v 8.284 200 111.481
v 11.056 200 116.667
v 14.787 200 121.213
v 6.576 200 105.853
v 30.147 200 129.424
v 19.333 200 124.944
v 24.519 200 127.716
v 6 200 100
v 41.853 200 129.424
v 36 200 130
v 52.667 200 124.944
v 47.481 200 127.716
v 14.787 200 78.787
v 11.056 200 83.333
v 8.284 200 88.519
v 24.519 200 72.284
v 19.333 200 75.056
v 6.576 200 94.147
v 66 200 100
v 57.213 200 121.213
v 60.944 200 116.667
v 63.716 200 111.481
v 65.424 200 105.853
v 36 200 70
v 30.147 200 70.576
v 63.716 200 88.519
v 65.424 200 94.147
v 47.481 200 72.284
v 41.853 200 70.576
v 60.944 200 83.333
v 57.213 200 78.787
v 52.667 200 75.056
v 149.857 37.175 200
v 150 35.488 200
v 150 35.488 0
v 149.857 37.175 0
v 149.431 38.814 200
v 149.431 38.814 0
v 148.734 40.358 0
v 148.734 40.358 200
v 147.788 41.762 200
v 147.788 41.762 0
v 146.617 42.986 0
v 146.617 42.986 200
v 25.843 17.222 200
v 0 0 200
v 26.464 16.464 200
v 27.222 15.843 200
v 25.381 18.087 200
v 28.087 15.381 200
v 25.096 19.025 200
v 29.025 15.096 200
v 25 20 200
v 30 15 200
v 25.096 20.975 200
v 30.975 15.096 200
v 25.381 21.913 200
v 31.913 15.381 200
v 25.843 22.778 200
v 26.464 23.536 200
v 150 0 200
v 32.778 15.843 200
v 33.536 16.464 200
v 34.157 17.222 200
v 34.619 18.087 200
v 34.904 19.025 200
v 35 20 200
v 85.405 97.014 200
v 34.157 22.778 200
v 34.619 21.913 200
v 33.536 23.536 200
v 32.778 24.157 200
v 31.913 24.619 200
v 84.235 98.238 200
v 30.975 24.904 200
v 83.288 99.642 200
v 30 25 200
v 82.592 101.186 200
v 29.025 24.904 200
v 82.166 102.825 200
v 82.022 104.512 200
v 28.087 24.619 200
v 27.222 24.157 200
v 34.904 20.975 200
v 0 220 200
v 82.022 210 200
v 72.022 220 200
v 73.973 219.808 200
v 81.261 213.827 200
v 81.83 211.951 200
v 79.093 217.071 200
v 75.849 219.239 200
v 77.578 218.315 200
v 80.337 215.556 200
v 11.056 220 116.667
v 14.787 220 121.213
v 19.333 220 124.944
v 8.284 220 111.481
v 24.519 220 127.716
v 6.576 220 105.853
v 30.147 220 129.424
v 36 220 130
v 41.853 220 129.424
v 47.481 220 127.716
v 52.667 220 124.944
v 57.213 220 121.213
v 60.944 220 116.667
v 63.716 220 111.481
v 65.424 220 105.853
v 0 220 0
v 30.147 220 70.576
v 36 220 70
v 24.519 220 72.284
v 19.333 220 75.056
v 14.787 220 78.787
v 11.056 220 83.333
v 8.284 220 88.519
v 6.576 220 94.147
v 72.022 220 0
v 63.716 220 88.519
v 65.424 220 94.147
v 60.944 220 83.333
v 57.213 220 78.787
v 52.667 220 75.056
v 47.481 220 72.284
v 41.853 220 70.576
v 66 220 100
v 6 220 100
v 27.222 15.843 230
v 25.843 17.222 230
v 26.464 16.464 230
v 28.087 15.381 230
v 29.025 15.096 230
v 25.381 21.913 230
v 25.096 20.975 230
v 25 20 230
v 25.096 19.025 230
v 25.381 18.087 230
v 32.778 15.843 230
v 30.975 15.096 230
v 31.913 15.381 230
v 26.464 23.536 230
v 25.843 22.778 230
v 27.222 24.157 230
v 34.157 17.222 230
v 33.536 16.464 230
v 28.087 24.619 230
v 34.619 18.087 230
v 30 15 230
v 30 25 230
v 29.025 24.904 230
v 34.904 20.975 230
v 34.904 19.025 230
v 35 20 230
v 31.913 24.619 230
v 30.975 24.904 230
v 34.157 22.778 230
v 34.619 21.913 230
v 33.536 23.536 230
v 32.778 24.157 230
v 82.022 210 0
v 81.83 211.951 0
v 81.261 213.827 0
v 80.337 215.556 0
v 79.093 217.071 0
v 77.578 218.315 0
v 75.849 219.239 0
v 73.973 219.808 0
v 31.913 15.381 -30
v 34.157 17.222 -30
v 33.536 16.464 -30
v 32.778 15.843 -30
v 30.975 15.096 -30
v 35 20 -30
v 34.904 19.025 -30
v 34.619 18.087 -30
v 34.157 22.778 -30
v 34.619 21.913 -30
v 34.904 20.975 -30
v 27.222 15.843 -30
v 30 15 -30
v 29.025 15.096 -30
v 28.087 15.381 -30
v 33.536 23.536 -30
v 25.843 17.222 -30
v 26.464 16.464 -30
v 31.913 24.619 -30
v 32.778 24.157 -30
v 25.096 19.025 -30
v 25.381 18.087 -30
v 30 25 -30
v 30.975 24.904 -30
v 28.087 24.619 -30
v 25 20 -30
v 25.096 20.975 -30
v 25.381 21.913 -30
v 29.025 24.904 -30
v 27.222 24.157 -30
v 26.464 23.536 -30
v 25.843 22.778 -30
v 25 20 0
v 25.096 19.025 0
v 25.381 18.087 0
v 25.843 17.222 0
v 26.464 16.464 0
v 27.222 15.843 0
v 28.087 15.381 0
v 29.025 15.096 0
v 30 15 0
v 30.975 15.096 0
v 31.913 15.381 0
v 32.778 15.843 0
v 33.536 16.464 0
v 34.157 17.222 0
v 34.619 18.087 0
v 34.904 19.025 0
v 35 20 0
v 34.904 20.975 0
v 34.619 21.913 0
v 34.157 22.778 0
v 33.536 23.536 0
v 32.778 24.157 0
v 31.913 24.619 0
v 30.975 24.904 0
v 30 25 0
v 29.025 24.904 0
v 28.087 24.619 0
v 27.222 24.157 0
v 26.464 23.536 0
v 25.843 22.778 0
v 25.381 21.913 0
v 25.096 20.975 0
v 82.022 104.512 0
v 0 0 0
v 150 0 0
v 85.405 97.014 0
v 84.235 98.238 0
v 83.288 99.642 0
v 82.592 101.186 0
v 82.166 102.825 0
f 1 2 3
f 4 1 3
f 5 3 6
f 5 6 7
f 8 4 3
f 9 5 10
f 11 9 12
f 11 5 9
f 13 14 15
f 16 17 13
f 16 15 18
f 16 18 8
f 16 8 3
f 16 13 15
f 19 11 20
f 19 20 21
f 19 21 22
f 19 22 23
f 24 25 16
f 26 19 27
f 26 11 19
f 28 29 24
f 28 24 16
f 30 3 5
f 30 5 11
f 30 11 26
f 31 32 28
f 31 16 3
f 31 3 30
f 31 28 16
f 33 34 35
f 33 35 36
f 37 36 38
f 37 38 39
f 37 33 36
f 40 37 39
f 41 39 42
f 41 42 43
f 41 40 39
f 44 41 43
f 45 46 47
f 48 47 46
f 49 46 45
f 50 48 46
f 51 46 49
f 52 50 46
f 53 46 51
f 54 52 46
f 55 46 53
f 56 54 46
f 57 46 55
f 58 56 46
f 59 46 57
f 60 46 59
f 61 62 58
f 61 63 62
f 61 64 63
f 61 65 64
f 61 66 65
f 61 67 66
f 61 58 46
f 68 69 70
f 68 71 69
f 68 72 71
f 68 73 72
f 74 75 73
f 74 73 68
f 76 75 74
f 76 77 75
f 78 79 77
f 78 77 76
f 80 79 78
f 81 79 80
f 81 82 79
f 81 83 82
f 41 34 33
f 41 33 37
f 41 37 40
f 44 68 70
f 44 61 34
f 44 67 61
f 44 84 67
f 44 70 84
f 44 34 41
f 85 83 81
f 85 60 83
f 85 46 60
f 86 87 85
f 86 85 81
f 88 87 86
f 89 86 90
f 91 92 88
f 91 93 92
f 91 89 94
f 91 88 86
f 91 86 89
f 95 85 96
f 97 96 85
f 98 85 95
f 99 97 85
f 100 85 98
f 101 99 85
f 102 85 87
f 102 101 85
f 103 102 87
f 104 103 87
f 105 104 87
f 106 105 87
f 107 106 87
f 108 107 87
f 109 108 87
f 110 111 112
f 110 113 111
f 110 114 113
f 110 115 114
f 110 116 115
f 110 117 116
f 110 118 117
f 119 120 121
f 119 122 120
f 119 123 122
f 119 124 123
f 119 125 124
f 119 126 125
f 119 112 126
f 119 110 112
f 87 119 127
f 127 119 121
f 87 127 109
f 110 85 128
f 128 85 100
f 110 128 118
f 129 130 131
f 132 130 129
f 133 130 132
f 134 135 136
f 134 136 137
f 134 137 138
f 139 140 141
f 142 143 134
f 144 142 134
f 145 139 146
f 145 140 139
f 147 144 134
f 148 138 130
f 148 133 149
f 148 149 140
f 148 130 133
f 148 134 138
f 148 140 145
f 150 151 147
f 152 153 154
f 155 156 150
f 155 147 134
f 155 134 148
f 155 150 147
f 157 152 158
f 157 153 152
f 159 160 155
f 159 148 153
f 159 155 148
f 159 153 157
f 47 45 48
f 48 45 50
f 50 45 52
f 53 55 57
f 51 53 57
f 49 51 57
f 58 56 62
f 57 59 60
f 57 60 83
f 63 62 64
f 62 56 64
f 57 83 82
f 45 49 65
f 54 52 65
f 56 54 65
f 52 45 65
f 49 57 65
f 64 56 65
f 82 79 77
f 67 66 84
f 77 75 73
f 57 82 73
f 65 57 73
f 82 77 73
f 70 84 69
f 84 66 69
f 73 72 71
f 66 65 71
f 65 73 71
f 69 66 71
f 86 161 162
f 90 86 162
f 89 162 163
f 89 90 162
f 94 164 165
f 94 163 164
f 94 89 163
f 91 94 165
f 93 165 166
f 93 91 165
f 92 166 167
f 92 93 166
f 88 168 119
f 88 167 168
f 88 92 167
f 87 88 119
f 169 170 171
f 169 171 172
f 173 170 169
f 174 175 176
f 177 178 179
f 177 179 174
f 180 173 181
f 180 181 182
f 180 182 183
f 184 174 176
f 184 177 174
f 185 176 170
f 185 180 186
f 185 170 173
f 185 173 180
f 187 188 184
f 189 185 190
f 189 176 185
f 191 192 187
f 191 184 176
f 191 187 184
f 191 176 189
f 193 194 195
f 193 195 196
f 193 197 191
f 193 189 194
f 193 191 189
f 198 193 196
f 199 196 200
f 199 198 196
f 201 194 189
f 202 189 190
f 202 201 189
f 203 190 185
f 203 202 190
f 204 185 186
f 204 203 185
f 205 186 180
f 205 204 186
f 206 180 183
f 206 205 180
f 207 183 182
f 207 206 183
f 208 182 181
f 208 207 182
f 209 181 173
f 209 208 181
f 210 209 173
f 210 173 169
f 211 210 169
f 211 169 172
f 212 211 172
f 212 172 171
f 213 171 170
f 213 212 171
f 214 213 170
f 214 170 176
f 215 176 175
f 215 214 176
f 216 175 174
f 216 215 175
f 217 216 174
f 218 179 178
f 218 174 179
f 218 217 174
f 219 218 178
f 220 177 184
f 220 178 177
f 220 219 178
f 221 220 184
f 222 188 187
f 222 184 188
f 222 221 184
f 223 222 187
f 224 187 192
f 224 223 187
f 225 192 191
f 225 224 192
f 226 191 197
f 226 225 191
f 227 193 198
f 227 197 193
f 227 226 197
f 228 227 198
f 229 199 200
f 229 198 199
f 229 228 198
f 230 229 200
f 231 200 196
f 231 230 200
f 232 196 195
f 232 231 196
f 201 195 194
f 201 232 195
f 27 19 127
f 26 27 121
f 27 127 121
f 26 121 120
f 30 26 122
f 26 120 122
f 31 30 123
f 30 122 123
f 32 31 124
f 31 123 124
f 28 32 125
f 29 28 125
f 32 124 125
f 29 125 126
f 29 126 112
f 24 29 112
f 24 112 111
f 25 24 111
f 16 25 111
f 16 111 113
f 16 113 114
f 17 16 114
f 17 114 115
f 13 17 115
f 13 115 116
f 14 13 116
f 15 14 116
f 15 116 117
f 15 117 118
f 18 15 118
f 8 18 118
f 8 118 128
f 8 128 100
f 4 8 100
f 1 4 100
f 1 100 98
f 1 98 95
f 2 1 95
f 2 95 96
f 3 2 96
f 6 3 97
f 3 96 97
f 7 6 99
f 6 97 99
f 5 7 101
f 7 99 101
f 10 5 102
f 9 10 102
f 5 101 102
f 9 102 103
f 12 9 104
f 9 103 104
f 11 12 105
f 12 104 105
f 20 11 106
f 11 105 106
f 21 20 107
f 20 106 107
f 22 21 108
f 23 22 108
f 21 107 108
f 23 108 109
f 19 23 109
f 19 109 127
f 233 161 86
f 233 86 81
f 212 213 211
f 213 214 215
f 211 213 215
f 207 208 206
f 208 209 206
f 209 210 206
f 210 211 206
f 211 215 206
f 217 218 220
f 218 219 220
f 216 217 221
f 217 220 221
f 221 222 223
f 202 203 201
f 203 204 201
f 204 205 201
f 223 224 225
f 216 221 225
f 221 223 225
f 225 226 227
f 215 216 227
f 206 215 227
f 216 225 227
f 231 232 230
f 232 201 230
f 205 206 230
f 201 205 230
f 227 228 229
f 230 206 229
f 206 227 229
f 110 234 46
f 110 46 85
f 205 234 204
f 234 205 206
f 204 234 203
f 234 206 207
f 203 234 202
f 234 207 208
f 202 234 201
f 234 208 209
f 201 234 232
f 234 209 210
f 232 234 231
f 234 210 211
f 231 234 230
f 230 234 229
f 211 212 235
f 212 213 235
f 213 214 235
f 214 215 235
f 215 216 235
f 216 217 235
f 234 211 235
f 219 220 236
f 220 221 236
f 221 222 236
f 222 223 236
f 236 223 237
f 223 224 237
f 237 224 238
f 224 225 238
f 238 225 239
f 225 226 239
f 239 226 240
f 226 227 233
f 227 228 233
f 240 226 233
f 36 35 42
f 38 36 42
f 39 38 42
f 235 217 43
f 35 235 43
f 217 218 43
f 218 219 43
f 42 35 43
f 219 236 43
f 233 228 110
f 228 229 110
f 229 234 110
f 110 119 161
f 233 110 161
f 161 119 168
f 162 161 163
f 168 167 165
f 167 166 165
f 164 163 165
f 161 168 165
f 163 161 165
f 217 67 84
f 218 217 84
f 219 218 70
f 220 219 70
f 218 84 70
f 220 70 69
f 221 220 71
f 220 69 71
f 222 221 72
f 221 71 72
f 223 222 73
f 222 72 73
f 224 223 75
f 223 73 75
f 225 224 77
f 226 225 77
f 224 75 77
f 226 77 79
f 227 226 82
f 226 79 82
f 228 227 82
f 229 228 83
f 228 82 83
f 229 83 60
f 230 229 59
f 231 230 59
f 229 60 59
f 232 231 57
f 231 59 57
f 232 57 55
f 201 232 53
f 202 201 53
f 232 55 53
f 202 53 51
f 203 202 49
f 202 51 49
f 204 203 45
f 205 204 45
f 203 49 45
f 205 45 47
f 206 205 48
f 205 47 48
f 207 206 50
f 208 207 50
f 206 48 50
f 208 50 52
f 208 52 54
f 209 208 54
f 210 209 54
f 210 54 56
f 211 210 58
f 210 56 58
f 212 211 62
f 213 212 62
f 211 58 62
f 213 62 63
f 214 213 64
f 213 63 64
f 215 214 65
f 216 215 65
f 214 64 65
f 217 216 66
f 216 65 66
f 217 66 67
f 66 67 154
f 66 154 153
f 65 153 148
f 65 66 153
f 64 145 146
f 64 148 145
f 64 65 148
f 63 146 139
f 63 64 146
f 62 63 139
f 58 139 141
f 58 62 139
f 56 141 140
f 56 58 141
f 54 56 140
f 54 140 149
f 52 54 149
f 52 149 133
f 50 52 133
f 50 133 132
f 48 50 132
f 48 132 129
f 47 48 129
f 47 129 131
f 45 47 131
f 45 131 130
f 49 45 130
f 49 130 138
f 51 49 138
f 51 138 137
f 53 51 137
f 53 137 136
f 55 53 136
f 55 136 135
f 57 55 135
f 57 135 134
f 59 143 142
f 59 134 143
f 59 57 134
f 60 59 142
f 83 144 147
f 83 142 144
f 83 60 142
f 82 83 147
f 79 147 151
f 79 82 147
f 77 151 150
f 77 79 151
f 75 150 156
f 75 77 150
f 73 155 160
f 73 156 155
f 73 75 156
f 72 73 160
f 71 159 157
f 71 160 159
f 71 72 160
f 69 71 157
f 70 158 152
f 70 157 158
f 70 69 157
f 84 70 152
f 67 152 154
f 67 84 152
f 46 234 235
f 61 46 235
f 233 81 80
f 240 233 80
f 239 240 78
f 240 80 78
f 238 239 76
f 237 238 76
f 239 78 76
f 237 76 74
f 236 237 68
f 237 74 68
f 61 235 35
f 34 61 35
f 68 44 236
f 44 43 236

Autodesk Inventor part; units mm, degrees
ref_plane "YZ Plane" through (0, 0, 0) normal (1, 0, 0) x (0, 1, 0)
ref_plane "XZ Plane" through (0, 0, 0) normal (0, 1, 0) x (-1, 0, 0)
ref_plane "XY Plane" through (0, 0, 0) normal (0, 0, 1) x (1, 0, 0)
sketch "Sketch18" plane through (0, 0, 0) normal (0, 0, 1) x (1, 0, 0)
  line L0 (0, 0) -> (0, 220)
  line L1 (0, 0) -> (150, 0)
  line L2 (0, 220) -> (82.0223, 220)
  line L3 (82.0223, 220) -> (82.0223, 100)
  line L4 (150, 0) -> (150, 40)
  line L5 (150, 40) -> (82.0223, 100)
  dimension "d72" = 220
  dimension "d73" = 150
  dimension "d74" = 120
  dimension "d75" = 40
extrude "Extrusion9" add sketch "Sketch18" along normal blind 200
sketch "Sketch20" plane through (0, 0, 200) normal (0, 0, 1) x (1, 0, 0)
  circle A0 centre (30, 20) radius 5
  point P0 (0, 0)
  dimension "d81" = 10
extrude "Extrusion11" cut sketch "Sketch20" against normal blind 200
fillet "Fillet3" radius 10 3 edges at (82.0223, 220, 100) (82.0223, 100, 100) (150, 40, 100)
sketch "Sketch21" plane through (0, 220, 200) normal (0, 1, 0) x (1, 0, 0)
  circle A0 centre (36, 100) radius 30
  point P0 (0, 200)
  dimension "d85" = 60
extrude "Extrusion12" cut sketch "Sketch21" against normal blind 20
sketch "Sketch22" plane through (0, 0, 0) normal (-1, 0, 0) x (0, 0, 1)
  point P0 (0, 0)
sketch "Sketch23" plane through (0, 0, 0) normal (0, 0, -1) x (-1, 0, 0)
  point P0 (0, 0)
sketch "Sketch24" plane through (0, 0, 0) normal (0, 0, -1) x (-1, 0, 0)
  circle A0 centre (-30, 20) radius 5 projected
  circle A1 centre (-30, 20) radius 5
  point P0 (0, 0)
extrude "Extrusion13" add sketch "Sketch24" along normal blind 30
sketch "Sketch25" plane through (0, 0, 200) normal (0, 0, 1) x (1, 0, 0)
  circle A0 centre (30, 20) radius 5 projected
  circle A1 centre (30, 20) radius 5
  point P0 (0, 0)
extrude "Extrusion14" add sketch "Sketch25" along normal blind 30
properties part number "leg"
